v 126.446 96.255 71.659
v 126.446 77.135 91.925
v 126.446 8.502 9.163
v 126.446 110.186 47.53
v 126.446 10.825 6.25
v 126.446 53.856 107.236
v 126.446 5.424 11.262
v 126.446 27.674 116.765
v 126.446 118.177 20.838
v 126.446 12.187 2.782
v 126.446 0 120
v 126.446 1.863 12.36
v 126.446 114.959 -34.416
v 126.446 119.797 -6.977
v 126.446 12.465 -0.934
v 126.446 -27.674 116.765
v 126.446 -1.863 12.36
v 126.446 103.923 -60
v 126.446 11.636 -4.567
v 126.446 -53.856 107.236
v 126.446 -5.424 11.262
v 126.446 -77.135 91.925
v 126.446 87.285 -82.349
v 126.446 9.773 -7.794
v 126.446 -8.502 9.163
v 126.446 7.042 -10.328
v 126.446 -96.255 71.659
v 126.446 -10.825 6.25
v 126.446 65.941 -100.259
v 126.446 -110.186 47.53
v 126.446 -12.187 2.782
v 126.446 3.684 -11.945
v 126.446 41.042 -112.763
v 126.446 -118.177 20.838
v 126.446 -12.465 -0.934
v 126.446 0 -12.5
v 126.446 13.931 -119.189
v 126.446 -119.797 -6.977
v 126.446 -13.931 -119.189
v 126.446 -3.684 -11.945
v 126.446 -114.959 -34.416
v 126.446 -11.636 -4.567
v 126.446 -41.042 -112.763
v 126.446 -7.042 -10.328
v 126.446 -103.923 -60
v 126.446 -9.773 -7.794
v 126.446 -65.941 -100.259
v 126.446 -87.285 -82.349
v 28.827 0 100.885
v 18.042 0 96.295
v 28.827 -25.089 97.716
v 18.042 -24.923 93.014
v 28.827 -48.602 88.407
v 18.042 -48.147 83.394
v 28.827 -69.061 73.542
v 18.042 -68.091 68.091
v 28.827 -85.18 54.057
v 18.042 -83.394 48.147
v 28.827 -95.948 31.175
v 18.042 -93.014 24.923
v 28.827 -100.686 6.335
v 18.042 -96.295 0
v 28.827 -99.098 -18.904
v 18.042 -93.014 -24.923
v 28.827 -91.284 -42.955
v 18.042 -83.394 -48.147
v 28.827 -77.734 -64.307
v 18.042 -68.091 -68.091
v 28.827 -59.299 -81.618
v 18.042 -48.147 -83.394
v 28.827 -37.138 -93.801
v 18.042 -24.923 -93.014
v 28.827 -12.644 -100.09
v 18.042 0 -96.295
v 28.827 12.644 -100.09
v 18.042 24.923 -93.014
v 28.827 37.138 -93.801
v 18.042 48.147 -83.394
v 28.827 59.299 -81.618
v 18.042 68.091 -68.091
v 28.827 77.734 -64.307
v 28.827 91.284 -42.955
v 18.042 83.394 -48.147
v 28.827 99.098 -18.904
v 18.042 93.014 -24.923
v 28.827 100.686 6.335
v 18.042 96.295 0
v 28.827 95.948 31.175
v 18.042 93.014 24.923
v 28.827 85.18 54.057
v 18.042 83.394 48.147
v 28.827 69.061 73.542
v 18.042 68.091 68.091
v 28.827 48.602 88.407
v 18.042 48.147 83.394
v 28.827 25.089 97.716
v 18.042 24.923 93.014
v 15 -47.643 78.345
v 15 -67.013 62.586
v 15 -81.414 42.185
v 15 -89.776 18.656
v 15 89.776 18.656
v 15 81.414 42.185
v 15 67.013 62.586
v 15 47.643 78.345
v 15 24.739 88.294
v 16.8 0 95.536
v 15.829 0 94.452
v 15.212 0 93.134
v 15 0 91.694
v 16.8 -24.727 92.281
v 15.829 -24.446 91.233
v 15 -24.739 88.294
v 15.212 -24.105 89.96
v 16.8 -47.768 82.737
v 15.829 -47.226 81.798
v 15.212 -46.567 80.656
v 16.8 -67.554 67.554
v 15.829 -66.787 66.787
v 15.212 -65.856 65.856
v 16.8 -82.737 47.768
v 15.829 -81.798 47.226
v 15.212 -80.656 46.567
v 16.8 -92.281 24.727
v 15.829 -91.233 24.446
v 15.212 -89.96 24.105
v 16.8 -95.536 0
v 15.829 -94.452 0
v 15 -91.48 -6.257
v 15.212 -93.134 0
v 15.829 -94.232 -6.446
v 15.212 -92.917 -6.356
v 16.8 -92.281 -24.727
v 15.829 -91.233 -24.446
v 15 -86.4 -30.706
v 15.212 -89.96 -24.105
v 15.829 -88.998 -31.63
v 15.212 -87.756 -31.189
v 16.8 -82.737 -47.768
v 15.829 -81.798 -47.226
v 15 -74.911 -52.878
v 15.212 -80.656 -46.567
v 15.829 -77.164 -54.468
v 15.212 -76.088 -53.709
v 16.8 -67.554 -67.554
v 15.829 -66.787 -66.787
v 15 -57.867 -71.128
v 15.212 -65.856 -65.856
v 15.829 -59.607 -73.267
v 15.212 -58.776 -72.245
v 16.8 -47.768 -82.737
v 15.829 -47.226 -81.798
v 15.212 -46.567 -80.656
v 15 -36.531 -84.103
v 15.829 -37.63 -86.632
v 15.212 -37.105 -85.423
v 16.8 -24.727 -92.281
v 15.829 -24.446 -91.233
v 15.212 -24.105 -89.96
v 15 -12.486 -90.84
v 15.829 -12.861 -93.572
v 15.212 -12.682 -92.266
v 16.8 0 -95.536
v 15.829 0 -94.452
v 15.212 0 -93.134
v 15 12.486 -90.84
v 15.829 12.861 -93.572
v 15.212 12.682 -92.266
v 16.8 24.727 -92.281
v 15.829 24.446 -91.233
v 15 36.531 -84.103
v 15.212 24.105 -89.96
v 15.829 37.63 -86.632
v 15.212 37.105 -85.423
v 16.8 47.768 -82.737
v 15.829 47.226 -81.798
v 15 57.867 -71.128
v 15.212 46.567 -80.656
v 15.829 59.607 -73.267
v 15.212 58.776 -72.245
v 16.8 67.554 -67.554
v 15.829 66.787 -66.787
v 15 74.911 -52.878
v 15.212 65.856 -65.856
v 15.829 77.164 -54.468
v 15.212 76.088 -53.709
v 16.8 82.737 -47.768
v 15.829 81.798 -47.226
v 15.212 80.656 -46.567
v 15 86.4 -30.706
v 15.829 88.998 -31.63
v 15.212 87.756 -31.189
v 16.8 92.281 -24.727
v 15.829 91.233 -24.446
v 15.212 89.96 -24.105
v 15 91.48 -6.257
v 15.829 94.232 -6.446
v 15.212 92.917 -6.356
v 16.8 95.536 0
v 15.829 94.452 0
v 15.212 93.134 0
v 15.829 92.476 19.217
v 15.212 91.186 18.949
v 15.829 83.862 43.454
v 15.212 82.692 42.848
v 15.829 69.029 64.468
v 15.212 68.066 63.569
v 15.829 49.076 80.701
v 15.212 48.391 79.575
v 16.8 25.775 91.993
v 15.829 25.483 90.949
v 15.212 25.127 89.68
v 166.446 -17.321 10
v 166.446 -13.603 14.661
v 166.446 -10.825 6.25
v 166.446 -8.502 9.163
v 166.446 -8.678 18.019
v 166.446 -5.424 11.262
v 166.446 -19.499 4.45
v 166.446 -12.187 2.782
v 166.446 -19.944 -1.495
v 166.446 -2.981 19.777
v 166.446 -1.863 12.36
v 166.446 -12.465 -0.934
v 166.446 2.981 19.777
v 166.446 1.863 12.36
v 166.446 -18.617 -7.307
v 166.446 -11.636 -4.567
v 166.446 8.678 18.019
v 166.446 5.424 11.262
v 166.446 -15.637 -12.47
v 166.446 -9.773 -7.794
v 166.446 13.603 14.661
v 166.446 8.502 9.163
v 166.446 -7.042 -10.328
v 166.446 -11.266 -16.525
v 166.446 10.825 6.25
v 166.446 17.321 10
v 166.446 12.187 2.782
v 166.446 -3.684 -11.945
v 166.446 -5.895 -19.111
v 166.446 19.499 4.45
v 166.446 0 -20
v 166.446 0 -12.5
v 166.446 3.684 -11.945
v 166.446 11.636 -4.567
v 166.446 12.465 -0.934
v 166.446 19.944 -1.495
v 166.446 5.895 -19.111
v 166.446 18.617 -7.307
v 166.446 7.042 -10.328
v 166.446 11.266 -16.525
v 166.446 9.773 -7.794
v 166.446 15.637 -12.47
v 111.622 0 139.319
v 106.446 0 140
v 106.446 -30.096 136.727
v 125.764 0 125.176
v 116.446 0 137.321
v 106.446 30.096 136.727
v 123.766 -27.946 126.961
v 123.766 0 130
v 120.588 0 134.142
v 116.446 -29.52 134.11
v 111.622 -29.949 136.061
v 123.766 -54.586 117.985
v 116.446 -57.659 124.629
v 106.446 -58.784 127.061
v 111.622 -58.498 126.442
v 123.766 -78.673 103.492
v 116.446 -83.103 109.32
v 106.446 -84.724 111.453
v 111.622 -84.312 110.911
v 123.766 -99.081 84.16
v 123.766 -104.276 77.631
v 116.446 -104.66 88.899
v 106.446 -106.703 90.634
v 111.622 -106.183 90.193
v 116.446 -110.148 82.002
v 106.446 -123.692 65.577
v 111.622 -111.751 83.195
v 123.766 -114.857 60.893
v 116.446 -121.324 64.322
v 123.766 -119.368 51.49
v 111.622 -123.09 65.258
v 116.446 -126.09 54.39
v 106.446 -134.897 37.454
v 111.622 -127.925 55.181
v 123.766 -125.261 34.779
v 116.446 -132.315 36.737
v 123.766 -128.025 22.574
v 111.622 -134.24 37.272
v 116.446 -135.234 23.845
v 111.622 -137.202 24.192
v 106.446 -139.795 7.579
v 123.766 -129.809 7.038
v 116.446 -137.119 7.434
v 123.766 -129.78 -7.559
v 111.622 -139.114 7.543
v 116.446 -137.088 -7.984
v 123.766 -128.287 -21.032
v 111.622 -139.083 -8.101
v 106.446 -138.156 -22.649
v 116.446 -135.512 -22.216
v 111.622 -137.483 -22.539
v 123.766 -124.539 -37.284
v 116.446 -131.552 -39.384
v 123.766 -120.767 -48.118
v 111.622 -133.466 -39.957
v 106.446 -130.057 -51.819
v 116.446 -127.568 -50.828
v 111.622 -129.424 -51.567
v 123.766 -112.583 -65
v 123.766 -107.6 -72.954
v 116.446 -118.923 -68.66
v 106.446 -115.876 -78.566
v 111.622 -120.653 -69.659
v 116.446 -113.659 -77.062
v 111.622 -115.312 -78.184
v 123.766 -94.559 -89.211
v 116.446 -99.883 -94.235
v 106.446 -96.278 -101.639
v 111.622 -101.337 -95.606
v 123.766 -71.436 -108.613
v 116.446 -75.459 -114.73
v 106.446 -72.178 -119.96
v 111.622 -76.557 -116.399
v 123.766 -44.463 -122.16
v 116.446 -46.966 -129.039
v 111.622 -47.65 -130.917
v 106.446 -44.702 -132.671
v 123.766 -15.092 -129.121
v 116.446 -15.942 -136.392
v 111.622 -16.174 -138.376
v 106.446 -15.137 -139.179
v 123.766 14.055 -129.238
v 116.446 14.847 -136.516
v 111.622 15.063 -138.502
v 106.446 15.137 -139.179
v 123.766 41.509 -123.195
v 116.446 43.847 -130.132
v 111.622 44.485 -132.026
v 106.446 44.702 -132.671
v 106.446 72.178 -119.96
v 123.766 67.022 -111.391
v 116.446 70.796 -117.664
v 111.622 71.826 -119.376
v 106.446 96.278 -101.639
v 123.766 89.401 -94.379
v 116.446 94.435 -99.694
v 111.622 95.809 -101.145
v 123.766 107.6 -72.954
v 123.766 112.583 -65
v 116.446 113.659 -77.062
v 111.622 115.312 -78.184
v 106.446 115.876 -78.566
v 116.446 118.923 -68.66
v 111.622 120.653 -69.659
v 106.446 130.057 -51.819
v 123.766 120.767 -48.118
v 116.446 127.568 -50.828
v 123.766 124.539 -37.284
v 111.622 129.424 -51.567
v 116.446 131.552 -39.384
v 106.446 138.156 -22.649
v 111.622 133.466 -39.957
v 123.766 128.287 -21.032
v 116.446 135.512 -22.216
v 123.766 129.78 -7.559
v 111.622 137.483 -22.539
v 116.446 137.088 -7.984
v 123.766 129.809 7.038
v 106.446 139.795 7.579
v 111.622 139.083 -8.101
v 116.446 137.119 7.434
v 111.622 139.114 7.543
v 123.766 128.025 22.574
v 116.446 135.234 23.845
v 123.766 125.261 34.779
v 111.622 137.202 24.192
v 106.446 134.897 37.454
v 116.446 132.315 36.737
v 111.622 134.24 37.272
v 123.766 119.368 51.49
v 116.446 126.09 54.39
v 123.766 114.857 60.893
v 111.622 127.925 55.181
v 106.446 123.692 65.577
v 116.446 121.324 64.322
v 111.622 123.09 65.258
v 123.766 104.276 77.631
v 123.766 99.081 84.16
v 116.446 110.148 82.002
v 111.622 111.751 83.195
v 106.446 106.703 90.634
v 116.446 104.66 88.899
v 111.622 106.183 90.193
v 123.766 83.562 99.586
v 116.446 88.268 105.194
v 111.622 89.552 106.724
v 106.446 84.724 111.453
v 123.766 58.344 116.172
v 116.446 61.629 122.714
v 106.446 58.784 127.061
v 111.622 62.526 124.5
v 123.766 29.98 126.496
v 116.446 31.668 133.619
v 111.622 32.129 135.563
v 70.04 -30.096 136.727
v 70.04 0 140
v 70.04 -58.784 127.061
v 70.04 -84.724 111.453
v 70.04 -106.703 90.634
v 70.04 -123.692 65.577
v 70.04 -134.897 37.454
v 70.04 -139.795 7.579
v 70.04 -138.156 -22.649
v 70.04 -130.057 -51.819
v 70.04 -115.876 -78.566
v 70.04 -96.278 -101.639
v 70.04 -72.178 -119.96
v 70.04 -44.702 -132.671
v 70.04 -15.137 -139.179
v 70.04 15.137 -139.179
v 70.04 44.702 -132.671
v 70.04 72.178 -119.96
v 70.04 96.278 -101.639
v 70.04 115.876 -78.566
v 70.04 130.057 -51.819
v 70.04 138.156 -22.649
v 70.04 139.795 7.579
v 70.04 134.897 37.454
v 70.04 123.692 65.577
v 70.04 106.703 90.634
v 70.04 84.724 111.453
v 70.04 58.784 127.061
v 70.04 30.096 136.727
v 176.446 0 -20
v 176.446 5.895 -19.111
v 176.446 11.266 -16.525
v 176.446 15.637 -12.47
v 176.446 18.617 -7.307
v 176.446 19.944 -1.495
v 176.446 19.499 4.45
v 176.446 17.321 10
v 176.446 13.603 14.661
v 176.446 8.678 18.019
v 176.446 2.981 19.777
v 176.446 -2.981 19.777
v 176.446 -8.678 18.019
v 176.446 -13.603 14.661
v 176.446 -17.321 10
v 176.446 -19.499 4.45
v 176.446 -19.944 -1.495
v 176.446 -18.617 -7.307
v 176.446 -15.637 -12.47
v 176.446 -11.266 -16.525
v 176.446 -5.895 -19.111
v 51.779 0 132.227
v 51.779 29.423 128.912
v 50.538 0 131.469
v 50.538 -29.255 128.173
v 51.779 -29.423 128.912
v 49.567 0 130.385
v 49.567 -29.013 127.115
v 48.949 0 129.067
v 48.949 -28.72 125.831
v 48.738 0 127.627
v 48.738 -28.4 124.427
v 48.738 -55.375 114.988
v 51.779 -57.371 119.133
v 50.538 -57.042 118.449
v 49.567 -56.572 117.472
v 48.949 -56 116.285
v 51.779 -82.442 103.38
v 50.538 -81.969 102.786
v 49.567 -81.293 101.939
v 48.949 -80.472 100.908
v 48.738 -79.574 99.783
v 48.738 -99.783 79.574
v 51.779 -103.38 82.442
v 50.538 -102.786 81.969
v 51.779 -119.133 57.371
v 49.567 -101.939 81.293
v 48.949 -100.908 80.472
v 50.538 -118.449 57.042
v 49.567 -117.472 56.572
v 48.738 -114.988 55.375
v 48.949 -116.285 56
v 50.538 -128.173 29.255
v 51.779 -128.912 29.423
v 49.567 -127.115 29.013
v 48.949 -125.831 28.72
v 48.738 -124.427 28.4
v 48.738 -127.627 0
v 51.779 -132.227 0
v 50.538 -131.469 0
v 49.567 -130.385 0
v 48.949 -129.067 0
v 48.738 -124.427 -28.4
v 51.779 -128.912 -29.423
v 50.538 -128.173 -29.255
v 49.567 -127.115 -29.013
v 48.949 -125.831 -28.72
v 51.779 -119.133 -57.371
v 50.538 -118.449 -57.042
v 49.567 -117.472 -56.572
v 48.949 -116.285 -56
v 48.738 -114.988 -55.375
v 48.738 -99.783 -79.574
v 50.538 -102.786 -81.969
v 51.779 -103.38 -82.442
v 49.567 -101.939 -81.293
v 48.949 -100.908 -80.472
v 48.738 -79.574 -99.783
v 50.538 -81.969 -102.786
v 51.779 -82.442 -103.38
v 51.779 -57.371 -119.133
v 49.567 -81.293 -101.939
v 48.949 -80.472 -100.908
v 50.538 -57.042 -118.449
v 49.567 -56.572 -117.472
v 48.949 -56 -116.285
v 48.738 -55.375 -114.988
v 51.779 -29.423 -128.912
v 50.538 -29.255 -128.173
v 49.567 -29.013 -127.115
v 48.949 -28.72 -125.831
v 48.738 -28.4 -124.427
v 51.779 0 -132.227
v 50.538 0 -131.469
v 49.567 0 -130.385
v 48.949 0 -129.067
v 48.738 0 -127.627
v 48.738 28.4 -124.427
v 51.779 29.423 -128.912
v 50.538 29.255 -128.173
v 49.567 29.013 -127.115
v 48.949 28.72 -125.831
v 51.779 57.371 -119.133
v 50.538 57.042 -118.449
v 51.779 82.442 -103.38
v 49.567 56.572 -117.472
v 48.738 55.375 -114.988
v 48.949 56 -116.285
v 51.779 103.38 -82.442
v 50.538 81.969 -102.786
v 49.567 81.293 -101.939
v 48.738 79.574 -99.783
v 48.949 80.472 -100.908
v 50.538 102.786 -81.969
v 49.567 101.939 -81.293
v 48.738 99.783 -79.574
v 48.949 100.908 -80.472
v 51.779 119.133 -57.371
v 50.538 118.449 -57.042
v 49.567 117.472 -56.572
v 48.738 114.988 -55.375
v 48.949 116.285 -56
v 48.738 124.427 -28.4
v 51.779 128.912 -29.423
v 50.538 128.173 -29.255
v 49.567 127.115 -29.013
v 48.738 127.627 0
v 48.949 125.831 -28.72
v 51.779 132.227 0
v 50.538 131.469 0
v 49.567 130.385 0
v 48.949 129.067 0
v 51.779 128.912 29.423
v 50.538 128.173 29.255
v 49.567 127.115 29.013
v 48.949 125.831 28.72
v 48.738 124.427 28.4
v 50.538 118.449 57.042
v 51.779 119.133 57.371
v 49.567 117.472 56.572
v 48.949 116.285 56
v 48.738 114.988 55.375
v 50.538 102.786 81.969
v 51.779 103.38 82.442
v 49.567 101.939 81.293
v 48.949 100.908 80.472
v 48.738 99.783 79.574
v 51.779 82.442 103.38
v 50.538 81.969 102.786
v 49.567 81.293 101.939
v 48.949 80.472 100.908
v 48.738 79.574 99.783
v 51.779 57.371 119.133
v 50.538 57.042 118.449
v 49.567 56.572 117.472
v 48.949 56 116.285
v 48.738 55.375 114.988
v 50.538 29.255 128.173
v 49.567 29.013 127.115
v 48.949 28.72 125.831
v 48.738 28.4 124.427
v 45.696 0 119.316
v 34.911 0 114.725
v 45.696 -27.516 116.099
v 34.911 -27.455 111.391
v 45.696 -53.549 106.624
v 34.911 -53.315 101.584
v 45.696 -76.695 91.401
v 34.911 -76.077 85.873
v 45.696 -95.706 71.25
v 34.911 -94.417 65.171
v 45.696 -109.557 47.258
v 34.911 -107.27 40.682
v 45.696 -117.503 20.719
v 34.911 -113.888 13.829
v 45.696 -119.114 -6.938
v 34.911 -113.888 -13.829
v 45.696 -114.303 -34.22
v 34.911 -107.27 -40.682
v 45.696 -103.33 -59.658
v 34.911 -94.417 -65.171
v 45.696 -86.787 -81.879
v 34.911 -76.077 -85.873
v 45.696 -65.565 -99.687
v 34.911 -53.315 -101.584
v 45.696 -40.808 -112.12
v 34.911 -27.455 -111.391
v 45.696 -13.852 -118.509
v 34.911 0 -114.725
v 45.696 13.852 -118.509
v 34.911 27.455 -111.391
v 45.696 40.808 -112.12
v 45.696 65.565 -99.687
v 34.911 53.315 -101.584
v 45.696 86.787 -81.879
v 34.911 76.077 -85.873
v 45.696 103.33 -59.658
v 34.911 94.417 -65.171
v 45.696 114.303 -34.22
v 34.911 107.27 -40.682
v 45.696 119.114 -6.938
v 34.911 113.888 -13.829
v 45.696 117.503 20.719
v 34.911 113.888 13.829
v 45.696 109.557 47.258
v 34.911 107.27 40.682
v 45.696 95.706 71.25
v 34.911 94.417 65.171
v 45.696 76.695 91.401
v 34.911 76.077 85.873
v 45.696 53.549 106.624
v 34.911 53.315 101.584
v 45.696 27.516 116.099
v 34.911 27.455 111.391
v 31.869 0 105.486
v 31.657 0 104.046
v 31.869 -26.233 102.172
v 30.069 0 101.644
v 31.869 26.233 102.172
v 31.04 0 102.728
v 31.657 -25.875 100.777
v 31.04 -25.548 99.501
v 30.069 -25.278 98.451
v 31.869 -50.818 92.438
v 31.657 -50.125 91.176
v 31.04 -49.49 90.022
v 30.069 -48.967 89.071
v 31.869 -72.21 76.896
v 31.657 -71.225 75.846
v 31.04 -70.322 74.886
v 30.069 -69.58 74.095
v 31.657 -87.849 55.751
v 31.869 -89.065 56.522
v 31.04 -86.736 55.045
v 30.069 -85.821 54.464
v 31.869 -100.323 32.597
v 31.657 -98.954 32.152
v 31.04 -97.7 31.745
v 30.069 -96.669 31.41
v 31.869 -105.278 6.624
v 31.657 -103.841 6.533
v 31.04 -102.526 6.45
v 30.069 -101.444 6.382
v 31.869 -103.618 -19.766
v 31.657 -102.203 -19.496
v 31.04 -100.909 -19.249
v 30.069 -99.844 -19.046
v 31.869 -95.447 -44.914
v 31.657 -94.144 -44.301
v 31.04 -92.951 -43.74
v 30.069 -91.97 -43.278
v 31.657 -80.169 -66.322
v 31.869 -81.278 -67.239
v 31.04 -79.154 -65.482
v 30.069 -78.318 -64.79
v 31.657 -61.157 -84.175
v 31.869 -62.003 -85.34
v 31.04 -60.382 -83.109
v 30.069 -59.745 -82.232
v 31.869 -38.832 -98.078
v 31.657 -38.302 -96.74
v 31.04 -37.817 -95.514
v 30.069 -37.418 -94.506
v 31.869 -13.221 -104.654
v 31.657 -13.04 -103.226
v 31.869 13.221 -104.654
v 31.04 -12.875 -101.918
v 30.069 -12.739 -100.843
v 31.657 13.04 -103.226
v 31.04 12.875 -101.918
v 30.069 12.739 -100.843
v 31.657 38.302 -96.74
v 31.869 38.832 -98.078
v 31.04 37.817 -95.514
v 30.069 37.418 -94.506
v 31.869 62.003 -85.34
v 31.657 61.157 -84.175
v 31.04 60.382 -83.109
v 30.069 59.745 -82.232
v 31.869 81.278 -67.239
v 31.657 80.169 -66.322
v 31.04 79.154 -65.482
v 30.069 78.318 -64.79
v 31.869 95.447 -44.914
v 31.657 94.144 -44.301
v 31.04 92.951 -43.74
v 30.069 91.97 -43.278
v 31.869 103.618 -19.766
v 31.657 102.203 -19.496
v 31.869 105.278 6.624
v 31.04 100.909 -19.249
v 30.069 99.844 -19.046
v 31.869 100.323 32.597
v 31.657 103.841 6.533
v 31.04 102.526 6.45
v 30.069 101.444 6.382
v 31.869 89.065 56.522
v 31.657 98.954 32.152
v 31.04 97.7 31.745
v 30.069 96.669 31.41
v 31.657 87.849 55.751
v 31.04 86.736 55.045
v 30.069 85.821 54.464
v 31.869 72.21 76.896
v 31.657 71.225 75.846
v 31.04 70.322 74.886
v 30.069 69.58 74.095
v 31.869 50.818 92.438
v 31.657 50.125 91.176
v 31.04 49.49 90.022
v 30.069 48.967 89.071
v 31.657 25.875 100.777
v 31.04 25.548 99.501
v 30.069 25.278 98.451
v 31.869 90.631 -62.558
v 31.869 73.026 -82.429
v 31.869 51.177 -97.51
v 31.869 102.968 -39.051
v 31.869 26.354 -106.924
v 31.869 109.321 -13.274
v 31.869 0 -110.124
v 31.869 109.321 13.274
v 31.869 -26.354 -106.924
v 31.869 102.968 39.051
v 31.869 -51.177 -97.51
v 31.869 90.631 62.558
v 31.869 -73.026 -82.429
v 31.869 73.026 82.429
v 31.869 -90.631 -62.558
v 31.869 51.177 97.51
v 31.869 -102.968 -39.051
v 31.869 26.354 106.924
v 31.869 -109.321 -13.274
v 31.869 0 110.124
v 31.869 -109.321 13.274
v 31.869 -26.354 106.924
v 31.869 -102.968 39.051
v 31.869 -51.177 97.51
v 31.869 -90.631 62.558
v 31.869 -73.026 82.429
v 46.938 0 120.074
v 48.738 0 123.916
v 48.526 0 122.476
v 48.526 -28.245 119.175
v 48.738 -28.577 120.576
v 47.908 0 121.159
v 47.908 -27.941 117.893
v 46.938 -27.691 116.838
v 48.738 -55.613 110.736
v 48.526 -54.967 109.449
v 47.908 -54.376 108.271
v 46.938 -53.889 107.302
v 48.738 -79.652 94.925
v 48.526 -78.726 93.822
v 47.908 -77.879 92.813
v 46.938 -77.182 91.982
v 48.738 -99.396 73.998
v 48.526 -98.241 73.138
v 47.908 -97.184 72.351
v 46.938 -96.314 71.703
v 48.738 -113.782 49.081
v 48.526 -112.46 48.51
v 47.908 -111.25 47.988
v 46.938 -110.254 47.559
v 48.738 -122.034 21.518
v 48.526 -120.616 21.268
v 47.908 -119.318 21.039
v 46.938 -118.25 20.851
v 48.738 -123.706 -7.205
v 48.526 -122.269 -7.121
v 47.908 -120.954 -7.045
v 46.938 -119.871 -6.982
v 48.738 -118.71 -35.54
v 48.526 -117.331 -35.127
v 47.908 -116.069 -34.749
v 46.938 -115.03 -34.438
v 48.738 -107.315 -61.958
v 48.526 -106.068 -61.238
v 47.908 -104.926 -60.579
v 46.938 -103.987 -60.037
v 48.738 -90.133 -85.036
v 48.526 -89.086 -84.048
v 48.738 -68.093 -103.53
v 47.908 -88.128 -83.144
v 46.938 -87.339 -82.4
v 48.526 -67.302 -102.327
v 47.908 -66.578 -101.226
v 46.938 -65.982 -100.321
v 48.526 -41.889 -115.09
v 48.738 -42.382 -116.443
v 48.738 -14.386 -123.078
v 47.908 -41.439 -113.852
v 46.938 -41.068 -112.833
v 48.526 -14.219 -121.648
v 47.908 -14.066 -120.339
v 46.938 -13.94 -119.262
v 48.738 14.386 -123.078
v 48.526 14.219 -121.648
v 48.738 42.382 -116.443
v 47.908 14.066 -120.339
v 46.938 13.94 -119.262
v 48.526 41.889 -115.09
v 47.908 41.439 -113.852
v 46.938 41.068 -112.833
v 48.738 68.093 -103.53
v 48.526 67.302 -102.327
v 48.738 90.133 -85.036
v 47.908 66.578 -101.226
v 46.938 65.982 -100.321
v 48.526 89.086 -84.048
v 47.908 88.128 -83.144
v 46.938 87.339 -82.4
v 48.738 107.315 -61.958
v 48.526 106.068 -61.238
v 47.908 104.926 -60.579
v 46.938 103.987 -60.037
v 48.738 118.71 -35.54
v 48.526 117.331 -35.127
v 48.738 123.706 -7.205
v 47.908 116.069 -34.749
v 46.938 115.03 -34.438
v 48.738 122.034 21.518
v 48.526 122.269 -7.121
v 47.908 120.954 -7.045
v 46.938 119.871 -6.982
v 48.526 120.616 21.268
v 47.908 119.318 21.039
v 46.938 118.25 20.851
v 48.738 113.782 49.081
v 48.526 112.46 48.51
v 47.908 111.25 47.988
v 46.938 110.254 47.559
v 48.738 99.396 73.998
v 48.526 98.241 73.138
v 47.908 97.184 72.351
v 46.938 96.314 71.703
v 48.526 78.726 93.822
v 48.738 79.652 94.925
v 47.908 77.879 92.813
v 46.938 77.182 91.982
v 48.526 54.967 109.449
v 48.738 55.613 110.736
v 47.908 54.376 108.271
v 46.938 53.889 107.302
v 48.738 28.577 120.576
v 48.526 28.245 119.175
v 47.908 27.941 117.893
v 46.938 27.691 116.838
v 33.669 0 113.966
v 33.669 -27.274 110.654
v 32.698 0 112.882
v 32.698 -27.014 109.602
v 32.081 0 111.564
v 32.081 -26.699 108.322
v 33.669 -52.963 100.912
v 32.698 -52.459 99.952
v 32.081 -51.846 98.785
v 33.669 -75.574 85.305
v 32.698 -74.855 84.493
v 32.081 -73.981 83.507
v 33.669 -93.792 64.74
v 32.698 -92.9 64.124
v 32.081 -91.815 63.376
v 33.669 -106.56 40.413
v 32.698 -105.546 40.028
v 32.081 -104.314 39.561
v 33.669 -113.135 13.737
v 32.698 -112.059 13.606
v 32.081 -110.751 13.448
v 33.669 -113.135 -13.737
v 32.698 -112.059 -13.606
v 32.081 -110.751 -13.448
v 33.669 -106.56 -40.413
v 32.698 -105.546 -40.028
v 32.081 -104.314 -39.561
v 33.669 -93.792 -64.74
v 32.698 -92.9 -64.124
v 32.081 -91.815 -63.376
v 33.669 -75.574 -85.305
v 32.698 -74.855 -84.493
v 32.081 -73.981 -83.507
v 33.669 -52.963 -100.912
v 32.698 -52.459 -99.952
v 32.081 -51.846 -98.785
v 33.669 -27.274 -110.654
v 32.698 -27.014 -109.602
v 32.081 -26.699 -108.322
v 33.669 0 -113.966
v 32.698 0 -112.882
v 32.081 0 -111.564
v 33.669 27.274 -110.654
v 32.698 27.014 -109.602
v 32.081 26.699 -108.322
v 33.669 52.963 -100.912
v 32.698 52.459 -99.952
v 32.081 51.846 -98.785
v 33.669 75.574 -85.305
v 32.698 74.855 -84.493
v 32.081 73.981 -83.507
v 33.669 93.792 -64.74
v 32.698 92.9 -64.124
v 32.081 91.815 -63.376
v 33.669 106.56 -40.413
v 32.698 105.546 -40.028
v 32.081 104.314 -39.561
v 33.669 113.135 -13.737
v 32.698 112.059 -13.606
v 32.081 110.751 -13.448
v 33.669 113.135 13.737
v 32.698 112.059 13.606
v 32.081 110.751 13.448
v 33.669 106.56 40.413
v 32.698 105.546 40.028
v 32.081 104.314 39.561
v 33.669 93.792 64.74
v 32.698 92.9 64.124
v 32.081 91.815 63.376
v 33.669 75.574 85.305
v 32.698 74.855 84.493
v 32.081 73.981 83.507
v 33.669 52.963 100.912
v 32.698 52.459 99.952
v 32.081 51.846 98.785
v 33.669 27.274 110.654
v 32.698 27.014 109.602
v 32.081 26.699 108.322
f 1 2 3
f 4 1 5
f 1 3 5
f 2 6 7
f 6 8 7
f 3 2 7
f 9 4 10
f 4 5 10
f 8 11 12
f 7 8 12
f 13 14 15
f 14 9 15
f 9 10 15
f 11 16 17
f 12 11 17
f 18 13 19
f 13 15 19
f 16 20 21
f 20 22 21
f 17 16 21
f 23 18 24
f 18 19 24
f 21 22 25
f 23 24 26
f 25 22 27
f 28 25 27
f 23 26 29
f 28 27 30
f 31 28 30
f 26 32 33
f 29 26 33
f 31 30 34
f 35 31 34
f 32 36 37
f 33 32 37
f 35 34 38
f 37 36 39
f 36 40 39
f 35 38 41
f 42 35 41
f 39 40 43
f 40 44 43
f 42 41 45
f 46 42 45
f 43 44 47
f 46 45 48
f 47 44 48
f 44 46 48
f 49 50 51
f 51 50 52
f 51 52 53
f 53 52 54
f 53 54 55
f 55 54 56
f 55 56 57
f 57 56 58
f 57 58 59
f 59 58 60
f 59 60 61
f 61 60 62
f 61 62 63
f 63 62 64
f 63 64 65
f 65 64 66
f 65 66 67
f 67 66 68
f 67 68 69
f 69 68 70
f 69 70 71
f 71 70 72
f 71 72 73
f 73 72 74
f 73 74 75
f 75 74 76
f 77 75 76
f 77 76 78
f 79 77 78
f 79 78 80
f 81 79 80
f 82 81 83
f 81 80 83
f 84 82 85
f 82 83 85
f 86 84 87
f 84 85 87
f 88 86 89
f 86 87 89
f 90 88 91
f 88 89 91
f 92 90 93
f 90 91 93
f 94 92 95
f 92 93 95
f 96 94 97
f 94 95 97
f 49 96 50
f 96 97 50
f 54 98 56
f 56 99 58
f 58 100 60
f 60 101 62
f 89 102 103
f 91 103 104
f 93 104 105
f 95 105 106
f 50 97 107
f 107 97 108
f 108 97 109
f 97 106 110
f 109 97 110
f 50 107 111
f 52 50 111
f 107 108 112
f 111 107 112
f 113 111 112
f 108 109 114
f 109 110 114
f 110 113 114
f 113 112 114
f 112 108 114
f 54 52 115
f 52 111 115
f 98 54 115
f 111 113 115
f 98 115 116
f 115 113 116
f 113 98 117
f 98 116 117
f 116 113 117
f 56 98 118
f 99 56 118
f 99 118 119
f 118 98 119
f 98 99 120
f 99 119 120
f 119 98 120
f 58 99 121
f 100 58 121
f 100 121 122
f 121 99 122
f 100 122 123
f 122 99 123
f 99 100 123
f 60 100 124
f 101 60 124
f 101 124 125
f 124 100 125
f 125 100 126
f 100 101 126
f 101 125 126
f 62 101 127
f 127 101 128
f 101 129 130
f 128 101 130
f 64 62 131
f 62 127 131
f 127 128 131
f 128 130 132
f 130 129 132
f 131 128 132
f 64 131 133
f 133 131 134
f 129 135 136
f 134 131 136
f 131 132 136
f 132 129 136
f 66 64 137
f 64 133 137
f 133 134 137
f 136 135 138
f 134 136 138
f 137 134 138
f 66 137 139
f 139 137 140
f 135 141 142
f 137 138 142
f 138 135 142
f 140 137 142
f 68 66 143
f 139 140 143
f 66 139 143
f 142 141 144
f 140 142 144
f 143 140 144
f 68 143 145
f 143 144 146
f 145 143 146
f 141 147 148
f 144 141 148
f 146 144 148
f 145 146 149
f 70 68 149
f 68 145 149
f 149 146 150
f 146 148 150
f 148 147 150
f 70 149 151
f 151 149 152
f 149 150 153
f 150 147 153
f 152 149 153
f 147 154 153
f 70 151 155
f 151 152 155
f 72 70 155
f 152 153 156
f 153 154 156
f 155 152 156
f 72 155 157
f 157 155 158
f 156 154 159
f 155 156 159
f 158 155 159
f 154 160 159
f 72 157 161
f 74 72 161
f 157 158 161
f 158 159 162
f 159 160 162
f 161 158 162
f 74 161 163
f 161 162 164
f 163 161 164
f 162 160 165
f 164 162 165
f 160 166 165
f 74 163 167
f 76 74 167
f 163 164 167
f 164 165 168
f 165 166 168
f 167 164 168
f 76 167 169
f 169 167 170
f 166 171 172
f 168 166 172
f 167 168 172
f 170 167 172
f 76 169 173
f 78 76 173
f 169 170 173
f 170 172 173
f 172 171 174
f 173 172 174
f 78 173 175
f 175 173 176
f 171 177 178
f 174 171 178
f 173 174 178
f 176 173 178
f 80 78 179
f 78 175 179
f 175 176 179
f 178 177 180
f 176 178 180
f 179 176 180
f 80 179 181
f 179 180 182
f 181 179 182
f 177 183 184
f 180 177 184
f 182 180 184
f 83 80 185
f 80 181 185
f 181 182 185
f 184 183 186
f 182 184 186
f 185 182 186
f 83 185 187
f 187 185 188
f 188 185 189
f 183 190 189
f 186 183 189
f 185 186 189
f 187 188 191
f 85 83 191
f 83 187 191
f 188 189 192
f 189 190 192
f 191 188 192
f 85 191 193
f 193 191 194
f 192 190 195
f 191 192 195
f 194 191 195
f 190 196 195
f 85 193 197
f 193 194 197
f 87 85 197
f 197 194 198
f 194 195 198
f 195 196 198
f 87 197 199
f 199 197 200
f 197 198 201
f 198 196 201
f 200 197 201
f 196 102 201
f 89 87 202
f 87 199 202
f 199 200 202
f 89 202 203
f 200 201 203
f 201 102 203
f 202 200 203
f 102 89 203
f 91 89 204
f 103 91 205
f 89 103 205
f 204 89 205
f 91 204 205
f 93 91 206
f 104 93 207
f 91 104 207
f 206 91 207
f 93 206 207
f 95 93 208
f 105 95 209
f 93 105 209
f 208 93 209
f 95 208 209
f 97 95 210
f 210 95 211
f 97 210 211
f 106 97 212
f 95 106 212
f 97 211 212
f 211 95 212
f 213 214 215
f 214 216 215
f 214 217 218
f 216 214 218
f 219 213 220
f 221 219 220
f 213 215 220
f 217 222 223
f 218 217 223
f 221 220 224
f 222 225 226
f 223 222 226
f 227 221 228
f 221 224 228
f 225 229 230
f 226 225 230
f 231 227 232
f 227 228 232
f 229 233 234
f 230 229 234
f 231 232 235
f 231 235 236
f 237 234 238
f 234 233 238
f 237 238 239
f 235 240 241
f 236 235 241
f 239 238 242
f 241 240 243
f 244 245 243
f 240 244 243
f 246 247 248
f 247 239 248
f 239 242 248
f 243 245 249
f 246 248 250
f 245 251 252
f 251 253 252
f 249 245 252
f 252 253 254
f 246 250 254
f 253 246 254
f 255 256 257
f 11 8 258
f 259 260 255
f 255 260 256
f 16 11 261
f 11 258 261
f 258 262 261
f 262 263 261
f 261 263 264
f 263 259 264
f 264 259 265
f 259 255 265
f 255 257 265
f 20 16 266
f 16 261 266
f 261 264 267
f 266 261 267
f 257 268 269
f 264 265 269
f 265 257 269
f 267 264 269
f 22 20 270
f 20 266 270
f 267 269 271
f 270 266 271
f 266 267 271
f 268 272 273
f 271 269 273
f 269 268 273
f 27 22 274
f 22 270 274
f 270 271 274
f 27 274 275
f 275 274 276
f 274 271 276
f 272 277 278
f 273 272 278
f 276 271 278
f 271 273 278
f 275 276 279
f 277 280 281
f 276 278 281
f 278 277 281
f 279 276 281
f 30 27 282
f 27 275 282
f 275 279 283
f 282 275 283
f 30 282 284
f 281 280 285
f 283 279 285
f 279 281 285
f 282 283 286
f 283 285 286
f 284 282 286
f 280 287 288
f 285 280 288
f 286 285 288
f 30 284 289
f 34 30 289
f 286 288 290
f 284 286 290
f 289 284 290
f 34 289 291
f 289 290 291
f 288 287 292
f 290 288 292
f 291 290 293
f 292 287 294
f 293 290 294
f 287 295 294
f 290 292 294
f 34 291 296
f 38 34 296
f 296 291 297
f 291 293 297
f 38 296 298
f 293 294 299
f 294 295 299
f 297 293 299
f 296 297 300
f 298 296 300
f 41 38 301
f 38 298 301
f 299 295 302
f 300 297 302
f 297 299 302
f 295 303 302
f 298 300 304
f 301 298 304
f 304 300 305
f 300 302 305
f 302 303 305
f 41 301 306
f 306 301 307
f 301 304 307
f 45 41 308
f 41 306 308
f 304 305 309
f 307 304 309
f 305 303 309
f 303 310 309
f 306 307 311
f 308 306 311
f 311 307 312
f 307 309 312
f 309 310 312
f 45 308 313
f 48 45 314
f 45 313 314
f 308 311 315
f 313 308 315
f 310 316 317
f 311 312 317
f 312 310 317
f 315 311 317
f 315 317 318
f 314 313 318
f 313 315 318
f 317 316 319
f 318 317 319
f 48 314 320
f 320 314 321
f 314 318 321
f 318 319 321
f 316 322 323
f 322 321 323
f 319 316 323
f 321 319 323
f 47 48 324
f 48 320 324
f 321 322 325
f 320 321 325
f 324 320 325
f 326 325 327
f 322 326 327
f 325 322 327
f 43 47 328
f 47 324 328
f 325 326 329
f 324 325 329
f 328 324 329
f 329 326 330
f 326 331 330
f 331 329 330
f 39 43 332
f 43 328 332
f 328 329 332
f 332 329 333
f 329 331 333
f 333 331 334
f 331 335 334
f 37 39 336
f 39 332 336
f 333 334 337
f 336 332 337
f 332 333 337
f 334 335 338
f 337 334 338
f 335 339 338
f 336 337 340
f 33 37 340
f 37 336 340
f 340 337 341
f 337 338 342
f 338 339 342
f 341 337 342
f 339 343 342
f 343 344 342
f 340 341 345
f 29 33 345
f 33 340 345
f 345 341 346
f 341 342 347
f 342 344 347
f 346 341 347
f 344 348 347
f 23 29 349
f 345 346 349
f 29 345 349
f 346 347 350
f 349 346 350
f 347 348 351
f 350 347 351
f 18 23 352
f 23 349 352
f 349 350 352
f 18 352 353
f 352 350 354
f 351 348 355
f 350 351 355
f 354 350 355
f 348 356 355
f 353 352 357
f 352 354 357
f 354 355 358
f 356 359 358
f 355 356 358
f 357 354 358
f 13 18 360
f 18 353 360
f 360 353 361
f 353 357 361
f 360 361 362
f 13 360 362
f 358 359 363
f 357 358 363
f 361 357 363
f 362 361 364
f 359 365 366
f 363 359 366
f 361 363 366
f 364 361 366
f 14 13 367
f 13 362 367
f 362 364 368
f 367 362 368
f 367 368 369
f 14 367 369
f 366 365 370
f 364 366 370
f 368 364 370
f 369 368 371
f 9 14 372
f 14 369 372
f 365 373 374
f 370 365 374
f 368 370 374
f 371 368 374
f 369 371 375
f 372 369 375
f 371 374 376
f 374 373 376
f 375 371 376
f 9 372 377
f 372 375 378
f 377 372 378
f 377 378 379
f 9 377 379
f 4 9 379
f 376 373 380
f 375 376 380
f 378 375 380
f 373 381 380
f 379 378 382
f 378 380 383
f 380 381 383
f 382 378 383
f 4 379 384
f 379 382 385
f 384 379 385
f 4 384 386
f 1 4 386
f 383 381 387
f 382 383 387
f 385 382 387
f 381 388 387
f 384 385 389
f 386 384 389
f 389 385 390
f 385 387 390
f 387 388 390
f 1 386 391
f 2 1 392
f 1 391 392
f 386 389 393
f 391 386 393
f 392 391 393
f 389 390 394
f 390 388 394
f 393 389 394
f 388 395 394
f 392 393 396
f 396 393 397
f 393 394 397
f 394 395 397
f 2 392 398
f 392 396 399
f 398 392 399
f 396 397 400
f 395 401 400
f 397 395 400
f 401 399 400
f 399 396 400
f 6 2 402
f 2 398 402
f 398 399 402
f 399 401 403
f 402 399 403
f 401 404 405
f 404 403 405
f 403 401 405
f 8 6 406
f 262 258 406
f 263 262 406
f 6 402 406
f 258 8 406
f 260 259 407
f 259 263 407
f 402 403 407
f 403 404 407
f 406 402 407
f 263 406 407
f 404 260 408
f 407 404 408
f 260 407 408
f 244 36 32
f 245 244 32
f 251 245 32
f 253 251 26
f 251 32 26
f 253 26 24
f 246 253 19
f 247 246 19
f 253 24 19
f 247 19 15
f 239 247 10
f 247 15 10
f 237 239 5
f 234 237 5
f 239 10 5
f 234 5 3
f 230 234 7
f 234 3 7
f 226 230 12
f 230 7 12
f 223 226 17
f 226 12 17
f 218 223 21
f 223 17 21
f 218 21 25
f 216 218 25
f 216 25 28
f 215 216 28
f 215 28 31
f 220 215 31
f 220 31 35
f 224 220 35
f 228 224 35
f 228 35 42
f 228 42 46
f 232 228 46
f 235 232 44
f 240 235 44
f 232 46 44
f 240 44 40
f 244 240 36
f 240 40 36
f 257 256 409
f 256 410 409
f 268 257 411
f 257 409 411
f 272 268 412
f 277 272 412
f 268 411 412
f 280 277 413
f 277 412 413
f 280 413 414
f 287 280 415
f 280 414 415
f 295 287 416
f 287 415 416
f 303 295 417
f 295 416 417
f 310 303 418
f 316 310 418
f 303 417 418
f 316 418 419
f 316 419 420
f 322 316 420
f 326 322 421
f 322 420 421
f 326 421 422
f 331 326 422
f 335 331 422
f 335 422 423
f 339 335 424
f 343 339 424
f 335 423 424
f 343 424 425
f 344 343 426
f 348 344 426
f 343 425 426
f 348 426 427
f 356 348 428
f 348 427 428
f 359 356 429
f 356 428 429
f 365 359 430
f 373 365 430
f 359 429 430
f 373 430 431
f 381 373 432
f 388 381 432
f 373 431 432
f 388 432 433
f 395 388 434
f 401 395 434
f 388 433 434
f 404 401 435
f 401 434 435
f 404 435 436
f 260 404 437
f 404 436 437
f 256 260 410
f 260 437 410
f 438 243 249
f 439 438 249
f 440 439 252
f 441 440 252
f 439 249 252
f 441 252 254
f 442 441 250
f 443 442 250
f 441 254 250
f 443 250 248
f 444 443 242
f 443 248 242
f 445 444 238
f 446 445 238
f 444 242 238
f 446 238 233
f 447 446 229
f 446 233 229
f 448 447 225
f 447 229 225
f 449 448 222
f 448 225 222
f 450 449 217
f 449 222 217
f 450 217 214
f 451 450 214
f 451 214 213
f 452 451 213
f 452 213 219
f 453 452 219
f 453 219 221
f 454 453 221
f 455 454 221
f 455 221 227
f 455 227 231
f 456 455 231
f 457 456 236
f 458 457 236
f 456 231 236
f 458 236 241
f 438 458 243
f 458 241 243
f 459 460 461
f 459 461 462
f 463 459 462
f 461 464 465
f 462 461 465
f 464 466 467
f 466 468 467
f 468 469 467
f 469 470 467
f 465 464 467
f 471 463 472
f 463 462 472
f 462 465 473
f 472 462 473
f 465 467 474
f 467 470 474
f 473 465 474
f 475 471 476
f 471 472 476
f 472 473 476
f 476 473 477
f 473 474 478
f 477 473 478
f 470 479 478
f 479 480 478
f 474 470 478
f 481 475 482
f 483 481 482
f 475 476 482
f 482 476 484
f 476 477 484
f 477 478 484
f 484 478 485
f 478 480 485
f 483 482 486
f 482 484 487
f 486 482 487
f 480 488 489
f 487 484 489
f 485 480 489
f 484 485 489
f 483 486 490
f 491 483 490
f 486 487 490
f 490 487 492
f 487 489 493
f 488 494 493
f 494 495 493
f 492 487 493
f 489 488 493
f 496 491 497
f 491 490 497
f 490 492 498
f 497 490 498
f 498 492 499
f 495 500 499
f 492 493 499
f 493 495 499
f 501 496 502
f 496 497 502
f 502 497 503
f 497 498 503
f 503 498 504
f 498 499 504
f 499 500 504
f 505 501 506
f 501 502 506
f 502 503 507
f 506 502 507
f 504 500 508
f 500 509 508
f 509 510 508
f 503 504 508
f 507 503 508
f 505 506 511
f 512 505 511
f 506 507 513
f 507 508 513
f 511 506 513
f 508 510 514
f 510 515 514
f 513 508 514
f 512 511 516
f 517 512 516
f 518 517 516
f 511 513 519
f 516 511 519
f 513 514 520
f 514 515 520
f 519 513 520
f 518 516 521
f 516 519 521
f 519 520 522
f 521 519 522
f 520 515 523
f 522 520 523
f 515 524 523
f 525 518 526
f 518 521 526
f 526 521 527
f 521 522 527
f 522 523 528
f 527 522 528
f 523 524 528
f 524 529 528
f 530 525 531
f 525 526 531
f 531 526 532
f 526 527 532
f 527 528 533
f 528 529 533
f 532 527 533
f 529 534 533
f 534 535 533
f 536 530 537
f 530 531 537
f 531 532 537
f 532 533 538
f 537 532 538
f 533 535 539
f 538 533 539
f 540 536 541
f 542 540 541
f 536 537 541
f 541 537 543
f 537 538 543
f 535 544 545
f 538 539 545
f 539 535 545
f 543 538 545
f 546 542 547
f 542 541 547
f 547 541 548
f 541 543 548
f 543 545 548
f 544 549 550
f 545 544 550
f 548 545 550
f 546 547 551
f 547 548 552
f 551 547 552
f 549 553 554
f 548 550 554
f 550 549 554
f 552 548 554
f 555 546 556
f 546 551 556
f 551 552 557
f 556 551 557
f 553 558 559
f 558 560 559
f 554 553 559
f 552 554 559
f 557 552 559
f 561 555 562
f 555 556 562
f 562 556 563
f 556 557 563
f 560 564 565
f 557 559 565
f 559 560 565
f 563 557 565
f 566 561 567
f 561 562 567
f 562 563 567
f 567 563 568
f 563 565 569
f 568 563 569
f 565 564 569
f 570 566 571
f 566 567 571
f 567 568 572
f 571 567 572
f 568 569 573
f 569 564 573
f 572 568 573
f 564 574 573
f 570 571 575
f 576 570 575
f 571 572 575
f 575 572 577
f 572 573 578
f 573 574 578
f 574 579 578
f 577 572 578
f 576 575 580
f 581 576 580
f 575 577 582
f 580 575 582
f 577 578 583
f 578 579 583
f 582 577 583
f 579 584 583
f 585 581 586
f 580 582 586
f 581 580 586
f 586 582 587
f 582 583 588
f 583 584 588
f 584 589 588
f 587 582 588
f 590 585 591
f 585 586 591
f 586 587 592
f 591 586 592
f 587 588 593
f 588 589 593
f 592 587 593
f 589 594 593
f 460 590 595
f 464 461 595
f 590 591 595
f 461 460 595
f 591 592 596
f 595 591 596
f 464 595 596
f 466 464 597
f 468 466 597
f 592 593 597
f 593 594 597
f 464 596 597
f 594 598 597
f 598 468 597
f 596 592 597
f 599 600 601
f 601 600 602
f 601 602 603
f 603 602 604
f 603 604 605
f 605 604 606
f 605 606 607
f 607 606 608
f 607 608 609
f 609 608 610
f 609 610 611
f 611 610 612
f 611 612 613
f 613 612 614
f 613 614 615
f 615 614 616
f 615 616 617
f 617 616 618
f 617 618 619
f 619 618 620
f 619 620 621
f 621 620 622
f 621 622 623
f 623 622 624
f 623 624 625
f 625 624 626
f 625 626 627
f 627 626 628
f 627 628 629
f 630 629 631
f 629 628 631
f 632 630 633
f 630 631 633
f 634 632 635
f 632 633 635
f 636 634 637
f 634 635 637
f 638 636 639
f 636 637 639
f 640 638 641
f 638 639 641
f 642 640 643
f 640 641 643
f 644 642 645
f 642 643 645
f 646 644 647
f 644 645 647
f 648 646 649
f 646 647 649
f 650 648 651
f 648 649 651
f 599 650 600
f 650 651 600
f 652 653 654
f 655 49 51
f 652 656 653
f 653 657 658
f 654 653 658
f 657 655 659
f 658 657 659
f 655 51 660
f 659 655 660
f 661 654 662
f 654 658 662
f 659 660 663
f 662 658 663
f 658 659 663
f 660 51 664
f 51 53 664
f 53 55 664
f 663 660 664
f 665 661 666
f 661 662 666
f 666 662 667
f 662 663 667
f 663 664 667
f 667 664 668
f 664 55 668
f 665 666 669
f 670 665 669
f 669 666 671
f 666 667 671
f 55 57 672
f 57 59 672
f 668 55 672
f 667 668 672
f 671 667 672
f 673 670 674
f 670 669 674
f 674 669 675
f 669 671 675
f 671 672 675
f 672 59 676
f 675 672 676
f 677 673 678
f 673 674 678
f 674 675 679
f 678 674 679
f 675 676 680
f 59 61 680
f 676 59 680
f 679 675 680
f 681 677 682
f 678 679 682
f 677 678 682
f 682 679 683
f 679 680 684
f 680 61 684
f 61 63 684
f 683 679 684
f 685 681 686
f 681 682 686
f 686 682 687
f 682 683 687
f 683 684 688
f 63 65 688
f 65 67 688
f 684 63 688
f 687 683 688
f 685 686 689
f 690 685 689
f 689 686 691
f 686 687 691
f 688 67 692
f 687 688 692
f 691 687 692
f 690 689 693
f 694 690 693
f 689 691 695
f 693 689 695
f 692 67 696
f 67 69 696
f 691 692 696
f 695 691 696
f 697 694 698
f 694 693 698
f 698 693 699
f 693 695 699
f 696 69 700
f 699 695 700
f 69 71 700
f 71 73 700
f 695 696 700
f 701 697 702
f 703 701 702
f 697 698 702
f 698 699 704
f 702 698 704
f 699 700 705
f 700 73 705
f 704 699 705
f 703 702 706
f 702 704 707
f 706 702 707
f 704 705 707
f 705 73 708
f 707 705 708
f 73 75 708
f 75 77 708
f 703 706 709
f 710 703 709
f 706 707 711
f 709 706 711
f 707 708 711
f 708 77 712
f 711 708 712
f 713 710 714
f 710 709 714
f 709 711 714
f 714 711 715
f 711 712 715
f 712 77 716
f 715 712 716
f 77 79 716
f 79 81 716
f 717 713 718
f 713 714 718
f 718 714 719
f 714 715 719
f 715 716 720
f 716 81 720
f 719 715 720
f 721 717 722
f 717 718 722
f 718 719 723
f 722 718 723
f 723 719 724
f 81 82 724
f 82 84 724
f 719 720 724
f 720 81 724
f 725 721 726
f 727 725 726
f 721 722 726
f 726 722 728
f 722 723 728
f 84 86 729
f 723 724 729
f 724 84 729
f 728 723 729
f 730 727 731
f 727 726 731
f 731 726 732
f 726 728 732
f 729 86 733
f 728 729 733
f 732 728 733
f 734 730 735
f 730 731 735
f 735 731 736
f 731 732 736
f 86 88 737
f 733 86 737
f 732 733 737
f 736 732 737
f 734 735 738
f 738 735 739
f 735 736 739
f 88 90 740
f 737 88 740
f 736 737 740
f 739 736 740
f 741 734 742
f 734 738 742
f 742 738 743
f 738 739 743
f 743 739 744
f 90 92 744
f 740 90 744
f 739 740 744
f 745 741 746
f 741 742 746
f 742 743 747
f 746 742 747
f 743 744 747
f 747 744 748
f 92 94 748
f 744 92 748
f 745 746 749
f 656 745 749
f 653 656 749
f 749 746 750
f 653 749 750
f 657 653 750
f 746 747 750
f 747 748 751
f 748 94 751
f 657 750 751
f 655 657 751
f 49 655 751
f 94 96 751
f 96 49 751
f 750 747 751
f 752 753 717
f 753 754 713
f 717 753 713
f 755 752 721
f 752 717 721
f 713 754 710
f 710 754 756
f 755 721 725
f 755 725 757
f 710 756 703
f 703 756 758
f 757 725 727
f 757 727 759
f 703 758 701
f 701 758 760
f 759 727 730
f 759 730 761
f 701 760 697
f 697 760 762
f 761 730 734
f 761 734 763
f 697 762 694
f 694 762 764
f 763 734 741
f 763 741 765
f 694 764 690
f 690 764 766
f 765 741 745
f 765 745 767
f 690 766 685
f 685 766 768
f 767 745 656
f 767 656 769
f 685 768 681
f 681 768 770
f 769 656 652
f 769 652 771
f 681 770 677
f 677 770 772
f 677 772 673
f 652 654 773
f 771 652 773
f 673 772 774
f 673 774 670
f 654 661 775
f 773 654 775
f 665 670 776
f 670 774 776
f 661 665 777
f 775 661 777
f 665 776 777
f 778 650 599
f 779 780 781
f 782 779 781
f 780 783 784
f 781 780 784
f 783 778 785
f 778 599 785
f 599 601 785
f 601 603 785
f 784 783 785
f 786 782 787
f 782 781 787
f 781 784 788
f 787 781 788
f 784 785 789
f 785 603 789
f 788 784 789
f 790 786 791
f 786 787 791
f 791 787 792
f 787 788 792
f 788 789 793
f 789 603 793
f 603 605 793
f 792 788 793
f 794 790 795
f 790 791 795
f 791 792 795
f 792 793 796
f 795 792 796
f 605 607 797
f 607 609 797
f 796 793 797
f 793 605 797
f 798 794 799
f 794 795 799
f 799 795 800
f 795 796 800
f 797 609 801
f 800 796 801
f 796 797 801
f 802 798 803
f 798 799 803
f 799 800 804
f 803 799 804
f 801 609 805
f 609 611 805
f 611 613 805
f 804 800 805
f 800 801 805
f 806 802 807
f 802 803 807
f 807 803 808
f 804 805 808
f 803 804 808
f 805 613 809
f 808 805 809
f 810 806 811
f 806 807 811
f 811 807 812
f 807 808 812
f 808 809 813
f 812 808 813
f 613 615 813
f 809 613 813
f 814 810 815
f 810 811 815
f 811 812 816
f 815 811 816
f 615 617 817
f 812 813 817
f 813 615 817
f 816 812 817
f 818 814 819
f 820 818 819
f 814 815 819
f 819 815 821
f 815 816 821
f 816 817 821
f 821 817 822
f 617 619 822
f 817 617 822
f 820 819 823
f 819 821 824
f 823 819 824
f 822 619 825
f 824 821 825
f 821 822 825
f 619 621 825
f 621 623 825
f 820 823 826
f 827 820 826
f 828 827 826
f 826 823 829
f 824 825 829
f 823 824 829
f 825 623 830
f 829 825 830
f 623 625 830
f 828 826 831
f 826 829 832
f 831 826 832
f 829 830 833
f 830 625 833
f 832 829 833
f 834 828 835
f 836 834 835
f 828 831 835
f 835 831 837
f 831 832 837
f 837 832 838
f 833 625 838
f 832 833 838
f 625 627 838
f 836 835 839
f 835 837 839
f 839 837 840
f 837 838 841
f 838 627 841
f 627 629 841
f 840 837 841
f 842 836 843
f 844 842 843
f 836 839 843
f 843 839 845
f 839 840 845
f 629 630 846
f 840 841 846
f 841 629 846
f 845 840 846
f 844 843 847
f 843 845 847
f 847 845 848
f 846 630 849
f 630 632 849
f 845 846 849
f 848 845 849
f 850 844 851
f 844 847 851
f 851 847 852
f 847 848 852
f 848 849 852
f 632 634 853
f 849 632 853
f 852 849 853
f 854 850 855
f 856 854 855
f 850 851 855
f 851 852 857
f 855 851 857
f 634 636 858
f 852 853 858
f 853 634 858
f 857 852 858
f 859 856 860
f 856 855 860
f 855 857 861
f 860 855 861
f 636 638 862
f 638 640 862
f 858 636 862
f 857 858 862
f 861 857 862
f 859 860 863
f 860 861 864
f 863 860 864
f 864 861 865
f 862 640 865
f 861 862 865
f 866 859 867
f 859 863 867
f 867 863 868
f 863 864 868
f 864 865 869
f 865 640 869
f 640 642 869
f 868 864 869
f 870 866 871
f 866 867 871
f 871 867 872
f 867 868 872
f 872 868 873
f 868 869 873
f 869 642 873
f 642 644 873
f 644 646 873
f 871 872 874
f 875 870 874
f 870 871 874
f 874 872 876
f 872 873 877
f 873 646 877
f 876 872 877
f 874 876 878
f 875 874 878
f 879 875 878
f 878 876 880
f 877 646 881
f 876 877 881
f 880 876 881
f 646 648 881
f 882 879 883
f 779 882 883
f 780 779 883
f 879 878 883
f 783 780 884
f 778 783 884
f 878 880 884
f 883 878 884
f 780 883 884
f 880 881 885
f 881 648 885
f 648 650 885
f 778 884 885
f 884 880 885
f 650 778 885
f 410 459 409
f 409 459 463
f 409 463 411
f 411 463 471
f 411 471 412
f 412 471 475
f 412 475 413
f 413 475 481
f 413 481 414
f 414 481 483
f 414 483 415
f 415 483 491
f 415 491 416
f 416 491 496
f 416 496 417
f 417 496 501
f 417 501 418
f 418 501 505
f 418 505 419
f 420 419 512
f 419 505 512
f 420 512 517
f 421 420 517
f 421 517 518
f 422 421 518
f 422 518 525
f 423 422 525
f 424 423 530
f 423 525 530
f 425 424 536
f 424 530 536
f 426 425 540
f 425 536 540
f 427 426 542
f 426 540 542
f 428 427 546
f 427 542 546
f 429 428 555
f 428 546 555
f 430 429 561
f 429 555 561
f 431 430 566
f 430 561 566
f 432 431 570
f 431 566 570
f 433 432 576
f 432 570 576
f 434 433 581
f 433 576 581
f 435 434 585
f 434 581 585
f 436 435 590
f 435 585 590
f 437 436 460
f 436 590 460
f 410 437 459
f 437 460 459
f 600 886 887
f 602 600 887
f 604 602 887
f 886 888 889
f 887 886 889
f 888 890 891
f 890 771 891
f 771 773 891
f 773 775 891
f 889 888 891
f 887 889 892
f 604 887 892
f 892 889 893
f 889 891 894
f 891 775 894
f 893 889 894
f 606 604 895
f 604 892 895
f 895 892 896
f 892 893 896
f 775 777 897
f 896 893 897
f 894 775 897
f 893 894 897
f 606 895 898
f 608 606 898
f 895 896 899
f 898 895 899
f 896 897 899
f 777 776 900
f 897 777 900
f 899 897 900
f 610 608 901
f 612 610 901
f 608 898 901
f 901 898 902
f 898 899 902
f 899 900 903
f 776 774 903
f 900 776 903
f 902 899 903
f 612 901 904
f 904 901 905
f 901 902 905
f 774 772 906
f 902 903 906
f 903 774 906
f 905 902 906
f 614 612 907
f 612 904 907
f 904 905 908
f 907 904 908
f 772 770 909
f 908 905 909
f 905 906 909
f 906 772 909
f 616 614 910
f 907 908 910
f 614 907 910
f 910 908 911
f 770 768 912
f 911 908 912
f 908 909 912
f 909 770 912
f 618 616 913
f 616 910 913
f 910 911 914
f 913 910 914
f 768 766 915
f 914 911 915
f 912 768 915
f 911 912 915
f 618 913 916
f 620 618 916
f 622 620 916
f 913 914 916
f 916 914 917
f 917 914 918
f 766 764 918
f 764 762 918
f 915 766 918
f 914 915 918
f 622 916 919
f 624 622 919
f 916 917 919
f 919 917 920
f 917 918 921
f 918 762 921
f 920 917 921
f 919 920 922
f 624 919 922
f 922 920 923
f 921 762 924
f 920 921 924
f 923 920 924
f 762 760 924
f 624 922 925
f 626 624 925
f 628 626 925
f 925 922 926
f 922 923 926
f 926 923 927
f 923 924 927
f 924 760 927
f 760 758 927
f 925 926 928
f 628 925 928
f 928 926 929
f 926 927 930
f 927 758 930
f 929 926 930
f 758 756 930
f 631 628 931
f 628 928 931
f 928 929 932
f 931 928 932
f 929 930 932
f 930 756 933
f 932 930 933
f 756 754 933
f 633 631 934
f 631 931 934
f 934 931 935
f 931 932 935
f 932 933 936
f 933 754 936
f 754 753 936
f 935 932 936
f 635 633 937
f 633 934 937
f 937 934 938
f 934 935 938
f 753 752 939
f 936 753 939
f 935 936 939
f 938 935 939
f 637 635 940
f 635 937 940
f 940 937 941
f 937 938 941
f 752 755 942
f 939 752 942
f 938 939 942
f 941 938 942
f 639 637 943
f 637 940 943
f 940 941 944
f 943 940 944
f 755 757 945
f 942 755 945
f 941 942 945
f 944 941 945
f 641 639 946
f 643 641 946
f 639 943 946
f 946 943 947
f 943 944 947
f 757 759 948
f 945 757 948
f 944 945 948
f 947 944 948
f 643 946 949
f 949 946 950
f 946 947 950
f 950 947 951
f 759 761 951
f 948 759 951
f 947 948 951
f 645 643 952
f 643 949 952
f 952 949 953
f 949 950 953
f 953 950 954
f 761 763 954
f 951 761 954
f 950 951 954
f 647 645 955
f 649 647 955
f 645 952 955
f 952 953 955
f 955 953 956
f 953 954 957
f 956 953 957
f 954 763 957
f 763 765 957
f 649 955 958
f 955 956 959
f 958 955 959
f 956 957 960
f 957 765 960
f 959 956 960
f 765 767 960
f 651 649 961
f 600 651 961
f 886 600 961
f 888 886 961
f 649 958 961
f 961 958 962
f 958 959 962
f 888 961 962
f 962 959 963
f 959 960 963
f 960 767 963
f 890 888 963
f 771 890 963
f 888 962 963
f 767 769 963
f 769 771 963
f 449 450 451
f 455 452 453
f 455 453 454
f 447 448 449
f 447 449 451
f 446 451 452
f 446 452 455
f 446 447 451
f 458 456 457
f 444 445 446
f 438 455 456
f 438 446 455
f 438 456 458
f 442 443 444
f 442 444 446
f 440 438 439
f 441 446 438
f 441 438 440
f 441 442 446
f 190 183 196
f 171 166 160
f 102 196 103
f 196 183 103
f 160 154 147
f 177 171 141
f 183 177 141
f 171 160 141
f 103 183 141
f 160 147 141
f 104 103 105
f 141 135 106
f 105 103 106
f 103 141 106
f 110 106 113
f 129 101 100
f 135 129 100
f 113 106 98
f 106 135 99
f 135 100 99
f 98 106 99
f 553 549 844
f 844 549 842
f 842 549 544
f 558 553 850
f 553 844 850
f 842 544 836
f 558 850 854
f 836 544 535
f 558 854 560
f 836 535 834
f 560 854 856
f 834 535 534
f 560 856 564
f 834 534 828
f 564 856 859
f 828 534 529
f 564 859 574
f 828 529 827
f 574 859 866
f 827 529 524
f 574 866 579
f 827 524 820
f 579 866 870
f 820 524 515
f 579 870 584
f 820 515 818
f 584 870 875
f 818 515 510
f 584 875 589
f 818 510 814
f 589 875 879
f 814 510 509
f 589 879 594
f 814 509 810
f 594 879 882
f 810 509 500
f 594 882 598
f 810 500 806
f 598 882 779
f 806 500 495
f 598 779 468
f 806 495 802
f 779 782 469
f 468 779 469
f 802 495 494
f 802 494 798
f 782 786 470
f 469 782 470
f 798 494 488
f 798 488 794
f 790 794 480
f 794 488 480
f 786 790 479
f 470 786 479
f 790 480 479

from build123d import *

# Parameters (mm, degrees)
REDONDEO3_R             = 5
CROQUIS2_R              = 12.5
SALIENTE_EXTRUIR1_DEPTH = 40
CROQUIS3_R              = 20
SALIENTE_EXTRUIR2_DEPTH = 10


with BuildPart() as part:
    # Croquis1 → Revolución1 (revolve)
    with BuildSketch(Plane(origin=(0, 0, 0), x_dir=(1, 0, 0), z_dir=(0, 1, 0))):
        with BuildLine():
            Line((106.445710743, 140), (70.03994637, 140))
            Line((70.03994637, 140), (48.737618848, 130.932753785))
            Line((48.737618848, 130.932753785), (48.737618848, 120.610275725))
            Line((48.737618848, 120.610275725), (31.868809424, 113.430137863))
            Line((31.868809424, 113.430137863), (31.868809424, 102.180137863))
            Line((31.868809424, 102.180137863), (15, 95))
            Line((15, 95), (15, 0))
            Line((15, 0), (70, 0))
            Line((70, 0), (126.445710743, 0))
            Line((126.445710743, 0), (126.445710743, 120))
            ThreePointArc((126.445710743, 120), (120.587846367, 134.142135624), (106.445710743, 140))
        make_face()
    revolve(axis=Axis((-209.218950064, 0, 0), (1, 0, 0)))

    # Redondeo3
    redondeo3_edges = [part.edges().sort_by_distance(p)[0] for p in [
        (15, 0, 95),
        (31.868809424, 0, 102.180137863),
        (31.868809424, 0, 113.430137863),
        (48.737618848, 0, 120.610275725),
        (48.737618848, 0, 130.932753785),
    ]]
    fillet(redondeo3_edges, radius=REDONDEO3_R)

    # Croquis2 → Saliente-Extruir1 (add)
    with BuildSketch(Plane(origin=(126.445710743, 0, 0), x_dir=(0, 0, -1), z_dir=(1, 0, 0))):
        Circle(CROQUIS2_R)
    extrude(amount=SALIENTE_EXTRUIR1_DEPTH)

    # Croquis3 → Saliente-Extruir2 (add)
    with BuildSketch(Plane(origin=(166.445710743, 0, 0), x_dir=(0, 0, -1), z_dir=(1, 0, 0))):
        Circle(CROQUIS3_R)
    extrude(amount=SALIENTE_EXTRUIR2_DEPTH)


solid = part.part
